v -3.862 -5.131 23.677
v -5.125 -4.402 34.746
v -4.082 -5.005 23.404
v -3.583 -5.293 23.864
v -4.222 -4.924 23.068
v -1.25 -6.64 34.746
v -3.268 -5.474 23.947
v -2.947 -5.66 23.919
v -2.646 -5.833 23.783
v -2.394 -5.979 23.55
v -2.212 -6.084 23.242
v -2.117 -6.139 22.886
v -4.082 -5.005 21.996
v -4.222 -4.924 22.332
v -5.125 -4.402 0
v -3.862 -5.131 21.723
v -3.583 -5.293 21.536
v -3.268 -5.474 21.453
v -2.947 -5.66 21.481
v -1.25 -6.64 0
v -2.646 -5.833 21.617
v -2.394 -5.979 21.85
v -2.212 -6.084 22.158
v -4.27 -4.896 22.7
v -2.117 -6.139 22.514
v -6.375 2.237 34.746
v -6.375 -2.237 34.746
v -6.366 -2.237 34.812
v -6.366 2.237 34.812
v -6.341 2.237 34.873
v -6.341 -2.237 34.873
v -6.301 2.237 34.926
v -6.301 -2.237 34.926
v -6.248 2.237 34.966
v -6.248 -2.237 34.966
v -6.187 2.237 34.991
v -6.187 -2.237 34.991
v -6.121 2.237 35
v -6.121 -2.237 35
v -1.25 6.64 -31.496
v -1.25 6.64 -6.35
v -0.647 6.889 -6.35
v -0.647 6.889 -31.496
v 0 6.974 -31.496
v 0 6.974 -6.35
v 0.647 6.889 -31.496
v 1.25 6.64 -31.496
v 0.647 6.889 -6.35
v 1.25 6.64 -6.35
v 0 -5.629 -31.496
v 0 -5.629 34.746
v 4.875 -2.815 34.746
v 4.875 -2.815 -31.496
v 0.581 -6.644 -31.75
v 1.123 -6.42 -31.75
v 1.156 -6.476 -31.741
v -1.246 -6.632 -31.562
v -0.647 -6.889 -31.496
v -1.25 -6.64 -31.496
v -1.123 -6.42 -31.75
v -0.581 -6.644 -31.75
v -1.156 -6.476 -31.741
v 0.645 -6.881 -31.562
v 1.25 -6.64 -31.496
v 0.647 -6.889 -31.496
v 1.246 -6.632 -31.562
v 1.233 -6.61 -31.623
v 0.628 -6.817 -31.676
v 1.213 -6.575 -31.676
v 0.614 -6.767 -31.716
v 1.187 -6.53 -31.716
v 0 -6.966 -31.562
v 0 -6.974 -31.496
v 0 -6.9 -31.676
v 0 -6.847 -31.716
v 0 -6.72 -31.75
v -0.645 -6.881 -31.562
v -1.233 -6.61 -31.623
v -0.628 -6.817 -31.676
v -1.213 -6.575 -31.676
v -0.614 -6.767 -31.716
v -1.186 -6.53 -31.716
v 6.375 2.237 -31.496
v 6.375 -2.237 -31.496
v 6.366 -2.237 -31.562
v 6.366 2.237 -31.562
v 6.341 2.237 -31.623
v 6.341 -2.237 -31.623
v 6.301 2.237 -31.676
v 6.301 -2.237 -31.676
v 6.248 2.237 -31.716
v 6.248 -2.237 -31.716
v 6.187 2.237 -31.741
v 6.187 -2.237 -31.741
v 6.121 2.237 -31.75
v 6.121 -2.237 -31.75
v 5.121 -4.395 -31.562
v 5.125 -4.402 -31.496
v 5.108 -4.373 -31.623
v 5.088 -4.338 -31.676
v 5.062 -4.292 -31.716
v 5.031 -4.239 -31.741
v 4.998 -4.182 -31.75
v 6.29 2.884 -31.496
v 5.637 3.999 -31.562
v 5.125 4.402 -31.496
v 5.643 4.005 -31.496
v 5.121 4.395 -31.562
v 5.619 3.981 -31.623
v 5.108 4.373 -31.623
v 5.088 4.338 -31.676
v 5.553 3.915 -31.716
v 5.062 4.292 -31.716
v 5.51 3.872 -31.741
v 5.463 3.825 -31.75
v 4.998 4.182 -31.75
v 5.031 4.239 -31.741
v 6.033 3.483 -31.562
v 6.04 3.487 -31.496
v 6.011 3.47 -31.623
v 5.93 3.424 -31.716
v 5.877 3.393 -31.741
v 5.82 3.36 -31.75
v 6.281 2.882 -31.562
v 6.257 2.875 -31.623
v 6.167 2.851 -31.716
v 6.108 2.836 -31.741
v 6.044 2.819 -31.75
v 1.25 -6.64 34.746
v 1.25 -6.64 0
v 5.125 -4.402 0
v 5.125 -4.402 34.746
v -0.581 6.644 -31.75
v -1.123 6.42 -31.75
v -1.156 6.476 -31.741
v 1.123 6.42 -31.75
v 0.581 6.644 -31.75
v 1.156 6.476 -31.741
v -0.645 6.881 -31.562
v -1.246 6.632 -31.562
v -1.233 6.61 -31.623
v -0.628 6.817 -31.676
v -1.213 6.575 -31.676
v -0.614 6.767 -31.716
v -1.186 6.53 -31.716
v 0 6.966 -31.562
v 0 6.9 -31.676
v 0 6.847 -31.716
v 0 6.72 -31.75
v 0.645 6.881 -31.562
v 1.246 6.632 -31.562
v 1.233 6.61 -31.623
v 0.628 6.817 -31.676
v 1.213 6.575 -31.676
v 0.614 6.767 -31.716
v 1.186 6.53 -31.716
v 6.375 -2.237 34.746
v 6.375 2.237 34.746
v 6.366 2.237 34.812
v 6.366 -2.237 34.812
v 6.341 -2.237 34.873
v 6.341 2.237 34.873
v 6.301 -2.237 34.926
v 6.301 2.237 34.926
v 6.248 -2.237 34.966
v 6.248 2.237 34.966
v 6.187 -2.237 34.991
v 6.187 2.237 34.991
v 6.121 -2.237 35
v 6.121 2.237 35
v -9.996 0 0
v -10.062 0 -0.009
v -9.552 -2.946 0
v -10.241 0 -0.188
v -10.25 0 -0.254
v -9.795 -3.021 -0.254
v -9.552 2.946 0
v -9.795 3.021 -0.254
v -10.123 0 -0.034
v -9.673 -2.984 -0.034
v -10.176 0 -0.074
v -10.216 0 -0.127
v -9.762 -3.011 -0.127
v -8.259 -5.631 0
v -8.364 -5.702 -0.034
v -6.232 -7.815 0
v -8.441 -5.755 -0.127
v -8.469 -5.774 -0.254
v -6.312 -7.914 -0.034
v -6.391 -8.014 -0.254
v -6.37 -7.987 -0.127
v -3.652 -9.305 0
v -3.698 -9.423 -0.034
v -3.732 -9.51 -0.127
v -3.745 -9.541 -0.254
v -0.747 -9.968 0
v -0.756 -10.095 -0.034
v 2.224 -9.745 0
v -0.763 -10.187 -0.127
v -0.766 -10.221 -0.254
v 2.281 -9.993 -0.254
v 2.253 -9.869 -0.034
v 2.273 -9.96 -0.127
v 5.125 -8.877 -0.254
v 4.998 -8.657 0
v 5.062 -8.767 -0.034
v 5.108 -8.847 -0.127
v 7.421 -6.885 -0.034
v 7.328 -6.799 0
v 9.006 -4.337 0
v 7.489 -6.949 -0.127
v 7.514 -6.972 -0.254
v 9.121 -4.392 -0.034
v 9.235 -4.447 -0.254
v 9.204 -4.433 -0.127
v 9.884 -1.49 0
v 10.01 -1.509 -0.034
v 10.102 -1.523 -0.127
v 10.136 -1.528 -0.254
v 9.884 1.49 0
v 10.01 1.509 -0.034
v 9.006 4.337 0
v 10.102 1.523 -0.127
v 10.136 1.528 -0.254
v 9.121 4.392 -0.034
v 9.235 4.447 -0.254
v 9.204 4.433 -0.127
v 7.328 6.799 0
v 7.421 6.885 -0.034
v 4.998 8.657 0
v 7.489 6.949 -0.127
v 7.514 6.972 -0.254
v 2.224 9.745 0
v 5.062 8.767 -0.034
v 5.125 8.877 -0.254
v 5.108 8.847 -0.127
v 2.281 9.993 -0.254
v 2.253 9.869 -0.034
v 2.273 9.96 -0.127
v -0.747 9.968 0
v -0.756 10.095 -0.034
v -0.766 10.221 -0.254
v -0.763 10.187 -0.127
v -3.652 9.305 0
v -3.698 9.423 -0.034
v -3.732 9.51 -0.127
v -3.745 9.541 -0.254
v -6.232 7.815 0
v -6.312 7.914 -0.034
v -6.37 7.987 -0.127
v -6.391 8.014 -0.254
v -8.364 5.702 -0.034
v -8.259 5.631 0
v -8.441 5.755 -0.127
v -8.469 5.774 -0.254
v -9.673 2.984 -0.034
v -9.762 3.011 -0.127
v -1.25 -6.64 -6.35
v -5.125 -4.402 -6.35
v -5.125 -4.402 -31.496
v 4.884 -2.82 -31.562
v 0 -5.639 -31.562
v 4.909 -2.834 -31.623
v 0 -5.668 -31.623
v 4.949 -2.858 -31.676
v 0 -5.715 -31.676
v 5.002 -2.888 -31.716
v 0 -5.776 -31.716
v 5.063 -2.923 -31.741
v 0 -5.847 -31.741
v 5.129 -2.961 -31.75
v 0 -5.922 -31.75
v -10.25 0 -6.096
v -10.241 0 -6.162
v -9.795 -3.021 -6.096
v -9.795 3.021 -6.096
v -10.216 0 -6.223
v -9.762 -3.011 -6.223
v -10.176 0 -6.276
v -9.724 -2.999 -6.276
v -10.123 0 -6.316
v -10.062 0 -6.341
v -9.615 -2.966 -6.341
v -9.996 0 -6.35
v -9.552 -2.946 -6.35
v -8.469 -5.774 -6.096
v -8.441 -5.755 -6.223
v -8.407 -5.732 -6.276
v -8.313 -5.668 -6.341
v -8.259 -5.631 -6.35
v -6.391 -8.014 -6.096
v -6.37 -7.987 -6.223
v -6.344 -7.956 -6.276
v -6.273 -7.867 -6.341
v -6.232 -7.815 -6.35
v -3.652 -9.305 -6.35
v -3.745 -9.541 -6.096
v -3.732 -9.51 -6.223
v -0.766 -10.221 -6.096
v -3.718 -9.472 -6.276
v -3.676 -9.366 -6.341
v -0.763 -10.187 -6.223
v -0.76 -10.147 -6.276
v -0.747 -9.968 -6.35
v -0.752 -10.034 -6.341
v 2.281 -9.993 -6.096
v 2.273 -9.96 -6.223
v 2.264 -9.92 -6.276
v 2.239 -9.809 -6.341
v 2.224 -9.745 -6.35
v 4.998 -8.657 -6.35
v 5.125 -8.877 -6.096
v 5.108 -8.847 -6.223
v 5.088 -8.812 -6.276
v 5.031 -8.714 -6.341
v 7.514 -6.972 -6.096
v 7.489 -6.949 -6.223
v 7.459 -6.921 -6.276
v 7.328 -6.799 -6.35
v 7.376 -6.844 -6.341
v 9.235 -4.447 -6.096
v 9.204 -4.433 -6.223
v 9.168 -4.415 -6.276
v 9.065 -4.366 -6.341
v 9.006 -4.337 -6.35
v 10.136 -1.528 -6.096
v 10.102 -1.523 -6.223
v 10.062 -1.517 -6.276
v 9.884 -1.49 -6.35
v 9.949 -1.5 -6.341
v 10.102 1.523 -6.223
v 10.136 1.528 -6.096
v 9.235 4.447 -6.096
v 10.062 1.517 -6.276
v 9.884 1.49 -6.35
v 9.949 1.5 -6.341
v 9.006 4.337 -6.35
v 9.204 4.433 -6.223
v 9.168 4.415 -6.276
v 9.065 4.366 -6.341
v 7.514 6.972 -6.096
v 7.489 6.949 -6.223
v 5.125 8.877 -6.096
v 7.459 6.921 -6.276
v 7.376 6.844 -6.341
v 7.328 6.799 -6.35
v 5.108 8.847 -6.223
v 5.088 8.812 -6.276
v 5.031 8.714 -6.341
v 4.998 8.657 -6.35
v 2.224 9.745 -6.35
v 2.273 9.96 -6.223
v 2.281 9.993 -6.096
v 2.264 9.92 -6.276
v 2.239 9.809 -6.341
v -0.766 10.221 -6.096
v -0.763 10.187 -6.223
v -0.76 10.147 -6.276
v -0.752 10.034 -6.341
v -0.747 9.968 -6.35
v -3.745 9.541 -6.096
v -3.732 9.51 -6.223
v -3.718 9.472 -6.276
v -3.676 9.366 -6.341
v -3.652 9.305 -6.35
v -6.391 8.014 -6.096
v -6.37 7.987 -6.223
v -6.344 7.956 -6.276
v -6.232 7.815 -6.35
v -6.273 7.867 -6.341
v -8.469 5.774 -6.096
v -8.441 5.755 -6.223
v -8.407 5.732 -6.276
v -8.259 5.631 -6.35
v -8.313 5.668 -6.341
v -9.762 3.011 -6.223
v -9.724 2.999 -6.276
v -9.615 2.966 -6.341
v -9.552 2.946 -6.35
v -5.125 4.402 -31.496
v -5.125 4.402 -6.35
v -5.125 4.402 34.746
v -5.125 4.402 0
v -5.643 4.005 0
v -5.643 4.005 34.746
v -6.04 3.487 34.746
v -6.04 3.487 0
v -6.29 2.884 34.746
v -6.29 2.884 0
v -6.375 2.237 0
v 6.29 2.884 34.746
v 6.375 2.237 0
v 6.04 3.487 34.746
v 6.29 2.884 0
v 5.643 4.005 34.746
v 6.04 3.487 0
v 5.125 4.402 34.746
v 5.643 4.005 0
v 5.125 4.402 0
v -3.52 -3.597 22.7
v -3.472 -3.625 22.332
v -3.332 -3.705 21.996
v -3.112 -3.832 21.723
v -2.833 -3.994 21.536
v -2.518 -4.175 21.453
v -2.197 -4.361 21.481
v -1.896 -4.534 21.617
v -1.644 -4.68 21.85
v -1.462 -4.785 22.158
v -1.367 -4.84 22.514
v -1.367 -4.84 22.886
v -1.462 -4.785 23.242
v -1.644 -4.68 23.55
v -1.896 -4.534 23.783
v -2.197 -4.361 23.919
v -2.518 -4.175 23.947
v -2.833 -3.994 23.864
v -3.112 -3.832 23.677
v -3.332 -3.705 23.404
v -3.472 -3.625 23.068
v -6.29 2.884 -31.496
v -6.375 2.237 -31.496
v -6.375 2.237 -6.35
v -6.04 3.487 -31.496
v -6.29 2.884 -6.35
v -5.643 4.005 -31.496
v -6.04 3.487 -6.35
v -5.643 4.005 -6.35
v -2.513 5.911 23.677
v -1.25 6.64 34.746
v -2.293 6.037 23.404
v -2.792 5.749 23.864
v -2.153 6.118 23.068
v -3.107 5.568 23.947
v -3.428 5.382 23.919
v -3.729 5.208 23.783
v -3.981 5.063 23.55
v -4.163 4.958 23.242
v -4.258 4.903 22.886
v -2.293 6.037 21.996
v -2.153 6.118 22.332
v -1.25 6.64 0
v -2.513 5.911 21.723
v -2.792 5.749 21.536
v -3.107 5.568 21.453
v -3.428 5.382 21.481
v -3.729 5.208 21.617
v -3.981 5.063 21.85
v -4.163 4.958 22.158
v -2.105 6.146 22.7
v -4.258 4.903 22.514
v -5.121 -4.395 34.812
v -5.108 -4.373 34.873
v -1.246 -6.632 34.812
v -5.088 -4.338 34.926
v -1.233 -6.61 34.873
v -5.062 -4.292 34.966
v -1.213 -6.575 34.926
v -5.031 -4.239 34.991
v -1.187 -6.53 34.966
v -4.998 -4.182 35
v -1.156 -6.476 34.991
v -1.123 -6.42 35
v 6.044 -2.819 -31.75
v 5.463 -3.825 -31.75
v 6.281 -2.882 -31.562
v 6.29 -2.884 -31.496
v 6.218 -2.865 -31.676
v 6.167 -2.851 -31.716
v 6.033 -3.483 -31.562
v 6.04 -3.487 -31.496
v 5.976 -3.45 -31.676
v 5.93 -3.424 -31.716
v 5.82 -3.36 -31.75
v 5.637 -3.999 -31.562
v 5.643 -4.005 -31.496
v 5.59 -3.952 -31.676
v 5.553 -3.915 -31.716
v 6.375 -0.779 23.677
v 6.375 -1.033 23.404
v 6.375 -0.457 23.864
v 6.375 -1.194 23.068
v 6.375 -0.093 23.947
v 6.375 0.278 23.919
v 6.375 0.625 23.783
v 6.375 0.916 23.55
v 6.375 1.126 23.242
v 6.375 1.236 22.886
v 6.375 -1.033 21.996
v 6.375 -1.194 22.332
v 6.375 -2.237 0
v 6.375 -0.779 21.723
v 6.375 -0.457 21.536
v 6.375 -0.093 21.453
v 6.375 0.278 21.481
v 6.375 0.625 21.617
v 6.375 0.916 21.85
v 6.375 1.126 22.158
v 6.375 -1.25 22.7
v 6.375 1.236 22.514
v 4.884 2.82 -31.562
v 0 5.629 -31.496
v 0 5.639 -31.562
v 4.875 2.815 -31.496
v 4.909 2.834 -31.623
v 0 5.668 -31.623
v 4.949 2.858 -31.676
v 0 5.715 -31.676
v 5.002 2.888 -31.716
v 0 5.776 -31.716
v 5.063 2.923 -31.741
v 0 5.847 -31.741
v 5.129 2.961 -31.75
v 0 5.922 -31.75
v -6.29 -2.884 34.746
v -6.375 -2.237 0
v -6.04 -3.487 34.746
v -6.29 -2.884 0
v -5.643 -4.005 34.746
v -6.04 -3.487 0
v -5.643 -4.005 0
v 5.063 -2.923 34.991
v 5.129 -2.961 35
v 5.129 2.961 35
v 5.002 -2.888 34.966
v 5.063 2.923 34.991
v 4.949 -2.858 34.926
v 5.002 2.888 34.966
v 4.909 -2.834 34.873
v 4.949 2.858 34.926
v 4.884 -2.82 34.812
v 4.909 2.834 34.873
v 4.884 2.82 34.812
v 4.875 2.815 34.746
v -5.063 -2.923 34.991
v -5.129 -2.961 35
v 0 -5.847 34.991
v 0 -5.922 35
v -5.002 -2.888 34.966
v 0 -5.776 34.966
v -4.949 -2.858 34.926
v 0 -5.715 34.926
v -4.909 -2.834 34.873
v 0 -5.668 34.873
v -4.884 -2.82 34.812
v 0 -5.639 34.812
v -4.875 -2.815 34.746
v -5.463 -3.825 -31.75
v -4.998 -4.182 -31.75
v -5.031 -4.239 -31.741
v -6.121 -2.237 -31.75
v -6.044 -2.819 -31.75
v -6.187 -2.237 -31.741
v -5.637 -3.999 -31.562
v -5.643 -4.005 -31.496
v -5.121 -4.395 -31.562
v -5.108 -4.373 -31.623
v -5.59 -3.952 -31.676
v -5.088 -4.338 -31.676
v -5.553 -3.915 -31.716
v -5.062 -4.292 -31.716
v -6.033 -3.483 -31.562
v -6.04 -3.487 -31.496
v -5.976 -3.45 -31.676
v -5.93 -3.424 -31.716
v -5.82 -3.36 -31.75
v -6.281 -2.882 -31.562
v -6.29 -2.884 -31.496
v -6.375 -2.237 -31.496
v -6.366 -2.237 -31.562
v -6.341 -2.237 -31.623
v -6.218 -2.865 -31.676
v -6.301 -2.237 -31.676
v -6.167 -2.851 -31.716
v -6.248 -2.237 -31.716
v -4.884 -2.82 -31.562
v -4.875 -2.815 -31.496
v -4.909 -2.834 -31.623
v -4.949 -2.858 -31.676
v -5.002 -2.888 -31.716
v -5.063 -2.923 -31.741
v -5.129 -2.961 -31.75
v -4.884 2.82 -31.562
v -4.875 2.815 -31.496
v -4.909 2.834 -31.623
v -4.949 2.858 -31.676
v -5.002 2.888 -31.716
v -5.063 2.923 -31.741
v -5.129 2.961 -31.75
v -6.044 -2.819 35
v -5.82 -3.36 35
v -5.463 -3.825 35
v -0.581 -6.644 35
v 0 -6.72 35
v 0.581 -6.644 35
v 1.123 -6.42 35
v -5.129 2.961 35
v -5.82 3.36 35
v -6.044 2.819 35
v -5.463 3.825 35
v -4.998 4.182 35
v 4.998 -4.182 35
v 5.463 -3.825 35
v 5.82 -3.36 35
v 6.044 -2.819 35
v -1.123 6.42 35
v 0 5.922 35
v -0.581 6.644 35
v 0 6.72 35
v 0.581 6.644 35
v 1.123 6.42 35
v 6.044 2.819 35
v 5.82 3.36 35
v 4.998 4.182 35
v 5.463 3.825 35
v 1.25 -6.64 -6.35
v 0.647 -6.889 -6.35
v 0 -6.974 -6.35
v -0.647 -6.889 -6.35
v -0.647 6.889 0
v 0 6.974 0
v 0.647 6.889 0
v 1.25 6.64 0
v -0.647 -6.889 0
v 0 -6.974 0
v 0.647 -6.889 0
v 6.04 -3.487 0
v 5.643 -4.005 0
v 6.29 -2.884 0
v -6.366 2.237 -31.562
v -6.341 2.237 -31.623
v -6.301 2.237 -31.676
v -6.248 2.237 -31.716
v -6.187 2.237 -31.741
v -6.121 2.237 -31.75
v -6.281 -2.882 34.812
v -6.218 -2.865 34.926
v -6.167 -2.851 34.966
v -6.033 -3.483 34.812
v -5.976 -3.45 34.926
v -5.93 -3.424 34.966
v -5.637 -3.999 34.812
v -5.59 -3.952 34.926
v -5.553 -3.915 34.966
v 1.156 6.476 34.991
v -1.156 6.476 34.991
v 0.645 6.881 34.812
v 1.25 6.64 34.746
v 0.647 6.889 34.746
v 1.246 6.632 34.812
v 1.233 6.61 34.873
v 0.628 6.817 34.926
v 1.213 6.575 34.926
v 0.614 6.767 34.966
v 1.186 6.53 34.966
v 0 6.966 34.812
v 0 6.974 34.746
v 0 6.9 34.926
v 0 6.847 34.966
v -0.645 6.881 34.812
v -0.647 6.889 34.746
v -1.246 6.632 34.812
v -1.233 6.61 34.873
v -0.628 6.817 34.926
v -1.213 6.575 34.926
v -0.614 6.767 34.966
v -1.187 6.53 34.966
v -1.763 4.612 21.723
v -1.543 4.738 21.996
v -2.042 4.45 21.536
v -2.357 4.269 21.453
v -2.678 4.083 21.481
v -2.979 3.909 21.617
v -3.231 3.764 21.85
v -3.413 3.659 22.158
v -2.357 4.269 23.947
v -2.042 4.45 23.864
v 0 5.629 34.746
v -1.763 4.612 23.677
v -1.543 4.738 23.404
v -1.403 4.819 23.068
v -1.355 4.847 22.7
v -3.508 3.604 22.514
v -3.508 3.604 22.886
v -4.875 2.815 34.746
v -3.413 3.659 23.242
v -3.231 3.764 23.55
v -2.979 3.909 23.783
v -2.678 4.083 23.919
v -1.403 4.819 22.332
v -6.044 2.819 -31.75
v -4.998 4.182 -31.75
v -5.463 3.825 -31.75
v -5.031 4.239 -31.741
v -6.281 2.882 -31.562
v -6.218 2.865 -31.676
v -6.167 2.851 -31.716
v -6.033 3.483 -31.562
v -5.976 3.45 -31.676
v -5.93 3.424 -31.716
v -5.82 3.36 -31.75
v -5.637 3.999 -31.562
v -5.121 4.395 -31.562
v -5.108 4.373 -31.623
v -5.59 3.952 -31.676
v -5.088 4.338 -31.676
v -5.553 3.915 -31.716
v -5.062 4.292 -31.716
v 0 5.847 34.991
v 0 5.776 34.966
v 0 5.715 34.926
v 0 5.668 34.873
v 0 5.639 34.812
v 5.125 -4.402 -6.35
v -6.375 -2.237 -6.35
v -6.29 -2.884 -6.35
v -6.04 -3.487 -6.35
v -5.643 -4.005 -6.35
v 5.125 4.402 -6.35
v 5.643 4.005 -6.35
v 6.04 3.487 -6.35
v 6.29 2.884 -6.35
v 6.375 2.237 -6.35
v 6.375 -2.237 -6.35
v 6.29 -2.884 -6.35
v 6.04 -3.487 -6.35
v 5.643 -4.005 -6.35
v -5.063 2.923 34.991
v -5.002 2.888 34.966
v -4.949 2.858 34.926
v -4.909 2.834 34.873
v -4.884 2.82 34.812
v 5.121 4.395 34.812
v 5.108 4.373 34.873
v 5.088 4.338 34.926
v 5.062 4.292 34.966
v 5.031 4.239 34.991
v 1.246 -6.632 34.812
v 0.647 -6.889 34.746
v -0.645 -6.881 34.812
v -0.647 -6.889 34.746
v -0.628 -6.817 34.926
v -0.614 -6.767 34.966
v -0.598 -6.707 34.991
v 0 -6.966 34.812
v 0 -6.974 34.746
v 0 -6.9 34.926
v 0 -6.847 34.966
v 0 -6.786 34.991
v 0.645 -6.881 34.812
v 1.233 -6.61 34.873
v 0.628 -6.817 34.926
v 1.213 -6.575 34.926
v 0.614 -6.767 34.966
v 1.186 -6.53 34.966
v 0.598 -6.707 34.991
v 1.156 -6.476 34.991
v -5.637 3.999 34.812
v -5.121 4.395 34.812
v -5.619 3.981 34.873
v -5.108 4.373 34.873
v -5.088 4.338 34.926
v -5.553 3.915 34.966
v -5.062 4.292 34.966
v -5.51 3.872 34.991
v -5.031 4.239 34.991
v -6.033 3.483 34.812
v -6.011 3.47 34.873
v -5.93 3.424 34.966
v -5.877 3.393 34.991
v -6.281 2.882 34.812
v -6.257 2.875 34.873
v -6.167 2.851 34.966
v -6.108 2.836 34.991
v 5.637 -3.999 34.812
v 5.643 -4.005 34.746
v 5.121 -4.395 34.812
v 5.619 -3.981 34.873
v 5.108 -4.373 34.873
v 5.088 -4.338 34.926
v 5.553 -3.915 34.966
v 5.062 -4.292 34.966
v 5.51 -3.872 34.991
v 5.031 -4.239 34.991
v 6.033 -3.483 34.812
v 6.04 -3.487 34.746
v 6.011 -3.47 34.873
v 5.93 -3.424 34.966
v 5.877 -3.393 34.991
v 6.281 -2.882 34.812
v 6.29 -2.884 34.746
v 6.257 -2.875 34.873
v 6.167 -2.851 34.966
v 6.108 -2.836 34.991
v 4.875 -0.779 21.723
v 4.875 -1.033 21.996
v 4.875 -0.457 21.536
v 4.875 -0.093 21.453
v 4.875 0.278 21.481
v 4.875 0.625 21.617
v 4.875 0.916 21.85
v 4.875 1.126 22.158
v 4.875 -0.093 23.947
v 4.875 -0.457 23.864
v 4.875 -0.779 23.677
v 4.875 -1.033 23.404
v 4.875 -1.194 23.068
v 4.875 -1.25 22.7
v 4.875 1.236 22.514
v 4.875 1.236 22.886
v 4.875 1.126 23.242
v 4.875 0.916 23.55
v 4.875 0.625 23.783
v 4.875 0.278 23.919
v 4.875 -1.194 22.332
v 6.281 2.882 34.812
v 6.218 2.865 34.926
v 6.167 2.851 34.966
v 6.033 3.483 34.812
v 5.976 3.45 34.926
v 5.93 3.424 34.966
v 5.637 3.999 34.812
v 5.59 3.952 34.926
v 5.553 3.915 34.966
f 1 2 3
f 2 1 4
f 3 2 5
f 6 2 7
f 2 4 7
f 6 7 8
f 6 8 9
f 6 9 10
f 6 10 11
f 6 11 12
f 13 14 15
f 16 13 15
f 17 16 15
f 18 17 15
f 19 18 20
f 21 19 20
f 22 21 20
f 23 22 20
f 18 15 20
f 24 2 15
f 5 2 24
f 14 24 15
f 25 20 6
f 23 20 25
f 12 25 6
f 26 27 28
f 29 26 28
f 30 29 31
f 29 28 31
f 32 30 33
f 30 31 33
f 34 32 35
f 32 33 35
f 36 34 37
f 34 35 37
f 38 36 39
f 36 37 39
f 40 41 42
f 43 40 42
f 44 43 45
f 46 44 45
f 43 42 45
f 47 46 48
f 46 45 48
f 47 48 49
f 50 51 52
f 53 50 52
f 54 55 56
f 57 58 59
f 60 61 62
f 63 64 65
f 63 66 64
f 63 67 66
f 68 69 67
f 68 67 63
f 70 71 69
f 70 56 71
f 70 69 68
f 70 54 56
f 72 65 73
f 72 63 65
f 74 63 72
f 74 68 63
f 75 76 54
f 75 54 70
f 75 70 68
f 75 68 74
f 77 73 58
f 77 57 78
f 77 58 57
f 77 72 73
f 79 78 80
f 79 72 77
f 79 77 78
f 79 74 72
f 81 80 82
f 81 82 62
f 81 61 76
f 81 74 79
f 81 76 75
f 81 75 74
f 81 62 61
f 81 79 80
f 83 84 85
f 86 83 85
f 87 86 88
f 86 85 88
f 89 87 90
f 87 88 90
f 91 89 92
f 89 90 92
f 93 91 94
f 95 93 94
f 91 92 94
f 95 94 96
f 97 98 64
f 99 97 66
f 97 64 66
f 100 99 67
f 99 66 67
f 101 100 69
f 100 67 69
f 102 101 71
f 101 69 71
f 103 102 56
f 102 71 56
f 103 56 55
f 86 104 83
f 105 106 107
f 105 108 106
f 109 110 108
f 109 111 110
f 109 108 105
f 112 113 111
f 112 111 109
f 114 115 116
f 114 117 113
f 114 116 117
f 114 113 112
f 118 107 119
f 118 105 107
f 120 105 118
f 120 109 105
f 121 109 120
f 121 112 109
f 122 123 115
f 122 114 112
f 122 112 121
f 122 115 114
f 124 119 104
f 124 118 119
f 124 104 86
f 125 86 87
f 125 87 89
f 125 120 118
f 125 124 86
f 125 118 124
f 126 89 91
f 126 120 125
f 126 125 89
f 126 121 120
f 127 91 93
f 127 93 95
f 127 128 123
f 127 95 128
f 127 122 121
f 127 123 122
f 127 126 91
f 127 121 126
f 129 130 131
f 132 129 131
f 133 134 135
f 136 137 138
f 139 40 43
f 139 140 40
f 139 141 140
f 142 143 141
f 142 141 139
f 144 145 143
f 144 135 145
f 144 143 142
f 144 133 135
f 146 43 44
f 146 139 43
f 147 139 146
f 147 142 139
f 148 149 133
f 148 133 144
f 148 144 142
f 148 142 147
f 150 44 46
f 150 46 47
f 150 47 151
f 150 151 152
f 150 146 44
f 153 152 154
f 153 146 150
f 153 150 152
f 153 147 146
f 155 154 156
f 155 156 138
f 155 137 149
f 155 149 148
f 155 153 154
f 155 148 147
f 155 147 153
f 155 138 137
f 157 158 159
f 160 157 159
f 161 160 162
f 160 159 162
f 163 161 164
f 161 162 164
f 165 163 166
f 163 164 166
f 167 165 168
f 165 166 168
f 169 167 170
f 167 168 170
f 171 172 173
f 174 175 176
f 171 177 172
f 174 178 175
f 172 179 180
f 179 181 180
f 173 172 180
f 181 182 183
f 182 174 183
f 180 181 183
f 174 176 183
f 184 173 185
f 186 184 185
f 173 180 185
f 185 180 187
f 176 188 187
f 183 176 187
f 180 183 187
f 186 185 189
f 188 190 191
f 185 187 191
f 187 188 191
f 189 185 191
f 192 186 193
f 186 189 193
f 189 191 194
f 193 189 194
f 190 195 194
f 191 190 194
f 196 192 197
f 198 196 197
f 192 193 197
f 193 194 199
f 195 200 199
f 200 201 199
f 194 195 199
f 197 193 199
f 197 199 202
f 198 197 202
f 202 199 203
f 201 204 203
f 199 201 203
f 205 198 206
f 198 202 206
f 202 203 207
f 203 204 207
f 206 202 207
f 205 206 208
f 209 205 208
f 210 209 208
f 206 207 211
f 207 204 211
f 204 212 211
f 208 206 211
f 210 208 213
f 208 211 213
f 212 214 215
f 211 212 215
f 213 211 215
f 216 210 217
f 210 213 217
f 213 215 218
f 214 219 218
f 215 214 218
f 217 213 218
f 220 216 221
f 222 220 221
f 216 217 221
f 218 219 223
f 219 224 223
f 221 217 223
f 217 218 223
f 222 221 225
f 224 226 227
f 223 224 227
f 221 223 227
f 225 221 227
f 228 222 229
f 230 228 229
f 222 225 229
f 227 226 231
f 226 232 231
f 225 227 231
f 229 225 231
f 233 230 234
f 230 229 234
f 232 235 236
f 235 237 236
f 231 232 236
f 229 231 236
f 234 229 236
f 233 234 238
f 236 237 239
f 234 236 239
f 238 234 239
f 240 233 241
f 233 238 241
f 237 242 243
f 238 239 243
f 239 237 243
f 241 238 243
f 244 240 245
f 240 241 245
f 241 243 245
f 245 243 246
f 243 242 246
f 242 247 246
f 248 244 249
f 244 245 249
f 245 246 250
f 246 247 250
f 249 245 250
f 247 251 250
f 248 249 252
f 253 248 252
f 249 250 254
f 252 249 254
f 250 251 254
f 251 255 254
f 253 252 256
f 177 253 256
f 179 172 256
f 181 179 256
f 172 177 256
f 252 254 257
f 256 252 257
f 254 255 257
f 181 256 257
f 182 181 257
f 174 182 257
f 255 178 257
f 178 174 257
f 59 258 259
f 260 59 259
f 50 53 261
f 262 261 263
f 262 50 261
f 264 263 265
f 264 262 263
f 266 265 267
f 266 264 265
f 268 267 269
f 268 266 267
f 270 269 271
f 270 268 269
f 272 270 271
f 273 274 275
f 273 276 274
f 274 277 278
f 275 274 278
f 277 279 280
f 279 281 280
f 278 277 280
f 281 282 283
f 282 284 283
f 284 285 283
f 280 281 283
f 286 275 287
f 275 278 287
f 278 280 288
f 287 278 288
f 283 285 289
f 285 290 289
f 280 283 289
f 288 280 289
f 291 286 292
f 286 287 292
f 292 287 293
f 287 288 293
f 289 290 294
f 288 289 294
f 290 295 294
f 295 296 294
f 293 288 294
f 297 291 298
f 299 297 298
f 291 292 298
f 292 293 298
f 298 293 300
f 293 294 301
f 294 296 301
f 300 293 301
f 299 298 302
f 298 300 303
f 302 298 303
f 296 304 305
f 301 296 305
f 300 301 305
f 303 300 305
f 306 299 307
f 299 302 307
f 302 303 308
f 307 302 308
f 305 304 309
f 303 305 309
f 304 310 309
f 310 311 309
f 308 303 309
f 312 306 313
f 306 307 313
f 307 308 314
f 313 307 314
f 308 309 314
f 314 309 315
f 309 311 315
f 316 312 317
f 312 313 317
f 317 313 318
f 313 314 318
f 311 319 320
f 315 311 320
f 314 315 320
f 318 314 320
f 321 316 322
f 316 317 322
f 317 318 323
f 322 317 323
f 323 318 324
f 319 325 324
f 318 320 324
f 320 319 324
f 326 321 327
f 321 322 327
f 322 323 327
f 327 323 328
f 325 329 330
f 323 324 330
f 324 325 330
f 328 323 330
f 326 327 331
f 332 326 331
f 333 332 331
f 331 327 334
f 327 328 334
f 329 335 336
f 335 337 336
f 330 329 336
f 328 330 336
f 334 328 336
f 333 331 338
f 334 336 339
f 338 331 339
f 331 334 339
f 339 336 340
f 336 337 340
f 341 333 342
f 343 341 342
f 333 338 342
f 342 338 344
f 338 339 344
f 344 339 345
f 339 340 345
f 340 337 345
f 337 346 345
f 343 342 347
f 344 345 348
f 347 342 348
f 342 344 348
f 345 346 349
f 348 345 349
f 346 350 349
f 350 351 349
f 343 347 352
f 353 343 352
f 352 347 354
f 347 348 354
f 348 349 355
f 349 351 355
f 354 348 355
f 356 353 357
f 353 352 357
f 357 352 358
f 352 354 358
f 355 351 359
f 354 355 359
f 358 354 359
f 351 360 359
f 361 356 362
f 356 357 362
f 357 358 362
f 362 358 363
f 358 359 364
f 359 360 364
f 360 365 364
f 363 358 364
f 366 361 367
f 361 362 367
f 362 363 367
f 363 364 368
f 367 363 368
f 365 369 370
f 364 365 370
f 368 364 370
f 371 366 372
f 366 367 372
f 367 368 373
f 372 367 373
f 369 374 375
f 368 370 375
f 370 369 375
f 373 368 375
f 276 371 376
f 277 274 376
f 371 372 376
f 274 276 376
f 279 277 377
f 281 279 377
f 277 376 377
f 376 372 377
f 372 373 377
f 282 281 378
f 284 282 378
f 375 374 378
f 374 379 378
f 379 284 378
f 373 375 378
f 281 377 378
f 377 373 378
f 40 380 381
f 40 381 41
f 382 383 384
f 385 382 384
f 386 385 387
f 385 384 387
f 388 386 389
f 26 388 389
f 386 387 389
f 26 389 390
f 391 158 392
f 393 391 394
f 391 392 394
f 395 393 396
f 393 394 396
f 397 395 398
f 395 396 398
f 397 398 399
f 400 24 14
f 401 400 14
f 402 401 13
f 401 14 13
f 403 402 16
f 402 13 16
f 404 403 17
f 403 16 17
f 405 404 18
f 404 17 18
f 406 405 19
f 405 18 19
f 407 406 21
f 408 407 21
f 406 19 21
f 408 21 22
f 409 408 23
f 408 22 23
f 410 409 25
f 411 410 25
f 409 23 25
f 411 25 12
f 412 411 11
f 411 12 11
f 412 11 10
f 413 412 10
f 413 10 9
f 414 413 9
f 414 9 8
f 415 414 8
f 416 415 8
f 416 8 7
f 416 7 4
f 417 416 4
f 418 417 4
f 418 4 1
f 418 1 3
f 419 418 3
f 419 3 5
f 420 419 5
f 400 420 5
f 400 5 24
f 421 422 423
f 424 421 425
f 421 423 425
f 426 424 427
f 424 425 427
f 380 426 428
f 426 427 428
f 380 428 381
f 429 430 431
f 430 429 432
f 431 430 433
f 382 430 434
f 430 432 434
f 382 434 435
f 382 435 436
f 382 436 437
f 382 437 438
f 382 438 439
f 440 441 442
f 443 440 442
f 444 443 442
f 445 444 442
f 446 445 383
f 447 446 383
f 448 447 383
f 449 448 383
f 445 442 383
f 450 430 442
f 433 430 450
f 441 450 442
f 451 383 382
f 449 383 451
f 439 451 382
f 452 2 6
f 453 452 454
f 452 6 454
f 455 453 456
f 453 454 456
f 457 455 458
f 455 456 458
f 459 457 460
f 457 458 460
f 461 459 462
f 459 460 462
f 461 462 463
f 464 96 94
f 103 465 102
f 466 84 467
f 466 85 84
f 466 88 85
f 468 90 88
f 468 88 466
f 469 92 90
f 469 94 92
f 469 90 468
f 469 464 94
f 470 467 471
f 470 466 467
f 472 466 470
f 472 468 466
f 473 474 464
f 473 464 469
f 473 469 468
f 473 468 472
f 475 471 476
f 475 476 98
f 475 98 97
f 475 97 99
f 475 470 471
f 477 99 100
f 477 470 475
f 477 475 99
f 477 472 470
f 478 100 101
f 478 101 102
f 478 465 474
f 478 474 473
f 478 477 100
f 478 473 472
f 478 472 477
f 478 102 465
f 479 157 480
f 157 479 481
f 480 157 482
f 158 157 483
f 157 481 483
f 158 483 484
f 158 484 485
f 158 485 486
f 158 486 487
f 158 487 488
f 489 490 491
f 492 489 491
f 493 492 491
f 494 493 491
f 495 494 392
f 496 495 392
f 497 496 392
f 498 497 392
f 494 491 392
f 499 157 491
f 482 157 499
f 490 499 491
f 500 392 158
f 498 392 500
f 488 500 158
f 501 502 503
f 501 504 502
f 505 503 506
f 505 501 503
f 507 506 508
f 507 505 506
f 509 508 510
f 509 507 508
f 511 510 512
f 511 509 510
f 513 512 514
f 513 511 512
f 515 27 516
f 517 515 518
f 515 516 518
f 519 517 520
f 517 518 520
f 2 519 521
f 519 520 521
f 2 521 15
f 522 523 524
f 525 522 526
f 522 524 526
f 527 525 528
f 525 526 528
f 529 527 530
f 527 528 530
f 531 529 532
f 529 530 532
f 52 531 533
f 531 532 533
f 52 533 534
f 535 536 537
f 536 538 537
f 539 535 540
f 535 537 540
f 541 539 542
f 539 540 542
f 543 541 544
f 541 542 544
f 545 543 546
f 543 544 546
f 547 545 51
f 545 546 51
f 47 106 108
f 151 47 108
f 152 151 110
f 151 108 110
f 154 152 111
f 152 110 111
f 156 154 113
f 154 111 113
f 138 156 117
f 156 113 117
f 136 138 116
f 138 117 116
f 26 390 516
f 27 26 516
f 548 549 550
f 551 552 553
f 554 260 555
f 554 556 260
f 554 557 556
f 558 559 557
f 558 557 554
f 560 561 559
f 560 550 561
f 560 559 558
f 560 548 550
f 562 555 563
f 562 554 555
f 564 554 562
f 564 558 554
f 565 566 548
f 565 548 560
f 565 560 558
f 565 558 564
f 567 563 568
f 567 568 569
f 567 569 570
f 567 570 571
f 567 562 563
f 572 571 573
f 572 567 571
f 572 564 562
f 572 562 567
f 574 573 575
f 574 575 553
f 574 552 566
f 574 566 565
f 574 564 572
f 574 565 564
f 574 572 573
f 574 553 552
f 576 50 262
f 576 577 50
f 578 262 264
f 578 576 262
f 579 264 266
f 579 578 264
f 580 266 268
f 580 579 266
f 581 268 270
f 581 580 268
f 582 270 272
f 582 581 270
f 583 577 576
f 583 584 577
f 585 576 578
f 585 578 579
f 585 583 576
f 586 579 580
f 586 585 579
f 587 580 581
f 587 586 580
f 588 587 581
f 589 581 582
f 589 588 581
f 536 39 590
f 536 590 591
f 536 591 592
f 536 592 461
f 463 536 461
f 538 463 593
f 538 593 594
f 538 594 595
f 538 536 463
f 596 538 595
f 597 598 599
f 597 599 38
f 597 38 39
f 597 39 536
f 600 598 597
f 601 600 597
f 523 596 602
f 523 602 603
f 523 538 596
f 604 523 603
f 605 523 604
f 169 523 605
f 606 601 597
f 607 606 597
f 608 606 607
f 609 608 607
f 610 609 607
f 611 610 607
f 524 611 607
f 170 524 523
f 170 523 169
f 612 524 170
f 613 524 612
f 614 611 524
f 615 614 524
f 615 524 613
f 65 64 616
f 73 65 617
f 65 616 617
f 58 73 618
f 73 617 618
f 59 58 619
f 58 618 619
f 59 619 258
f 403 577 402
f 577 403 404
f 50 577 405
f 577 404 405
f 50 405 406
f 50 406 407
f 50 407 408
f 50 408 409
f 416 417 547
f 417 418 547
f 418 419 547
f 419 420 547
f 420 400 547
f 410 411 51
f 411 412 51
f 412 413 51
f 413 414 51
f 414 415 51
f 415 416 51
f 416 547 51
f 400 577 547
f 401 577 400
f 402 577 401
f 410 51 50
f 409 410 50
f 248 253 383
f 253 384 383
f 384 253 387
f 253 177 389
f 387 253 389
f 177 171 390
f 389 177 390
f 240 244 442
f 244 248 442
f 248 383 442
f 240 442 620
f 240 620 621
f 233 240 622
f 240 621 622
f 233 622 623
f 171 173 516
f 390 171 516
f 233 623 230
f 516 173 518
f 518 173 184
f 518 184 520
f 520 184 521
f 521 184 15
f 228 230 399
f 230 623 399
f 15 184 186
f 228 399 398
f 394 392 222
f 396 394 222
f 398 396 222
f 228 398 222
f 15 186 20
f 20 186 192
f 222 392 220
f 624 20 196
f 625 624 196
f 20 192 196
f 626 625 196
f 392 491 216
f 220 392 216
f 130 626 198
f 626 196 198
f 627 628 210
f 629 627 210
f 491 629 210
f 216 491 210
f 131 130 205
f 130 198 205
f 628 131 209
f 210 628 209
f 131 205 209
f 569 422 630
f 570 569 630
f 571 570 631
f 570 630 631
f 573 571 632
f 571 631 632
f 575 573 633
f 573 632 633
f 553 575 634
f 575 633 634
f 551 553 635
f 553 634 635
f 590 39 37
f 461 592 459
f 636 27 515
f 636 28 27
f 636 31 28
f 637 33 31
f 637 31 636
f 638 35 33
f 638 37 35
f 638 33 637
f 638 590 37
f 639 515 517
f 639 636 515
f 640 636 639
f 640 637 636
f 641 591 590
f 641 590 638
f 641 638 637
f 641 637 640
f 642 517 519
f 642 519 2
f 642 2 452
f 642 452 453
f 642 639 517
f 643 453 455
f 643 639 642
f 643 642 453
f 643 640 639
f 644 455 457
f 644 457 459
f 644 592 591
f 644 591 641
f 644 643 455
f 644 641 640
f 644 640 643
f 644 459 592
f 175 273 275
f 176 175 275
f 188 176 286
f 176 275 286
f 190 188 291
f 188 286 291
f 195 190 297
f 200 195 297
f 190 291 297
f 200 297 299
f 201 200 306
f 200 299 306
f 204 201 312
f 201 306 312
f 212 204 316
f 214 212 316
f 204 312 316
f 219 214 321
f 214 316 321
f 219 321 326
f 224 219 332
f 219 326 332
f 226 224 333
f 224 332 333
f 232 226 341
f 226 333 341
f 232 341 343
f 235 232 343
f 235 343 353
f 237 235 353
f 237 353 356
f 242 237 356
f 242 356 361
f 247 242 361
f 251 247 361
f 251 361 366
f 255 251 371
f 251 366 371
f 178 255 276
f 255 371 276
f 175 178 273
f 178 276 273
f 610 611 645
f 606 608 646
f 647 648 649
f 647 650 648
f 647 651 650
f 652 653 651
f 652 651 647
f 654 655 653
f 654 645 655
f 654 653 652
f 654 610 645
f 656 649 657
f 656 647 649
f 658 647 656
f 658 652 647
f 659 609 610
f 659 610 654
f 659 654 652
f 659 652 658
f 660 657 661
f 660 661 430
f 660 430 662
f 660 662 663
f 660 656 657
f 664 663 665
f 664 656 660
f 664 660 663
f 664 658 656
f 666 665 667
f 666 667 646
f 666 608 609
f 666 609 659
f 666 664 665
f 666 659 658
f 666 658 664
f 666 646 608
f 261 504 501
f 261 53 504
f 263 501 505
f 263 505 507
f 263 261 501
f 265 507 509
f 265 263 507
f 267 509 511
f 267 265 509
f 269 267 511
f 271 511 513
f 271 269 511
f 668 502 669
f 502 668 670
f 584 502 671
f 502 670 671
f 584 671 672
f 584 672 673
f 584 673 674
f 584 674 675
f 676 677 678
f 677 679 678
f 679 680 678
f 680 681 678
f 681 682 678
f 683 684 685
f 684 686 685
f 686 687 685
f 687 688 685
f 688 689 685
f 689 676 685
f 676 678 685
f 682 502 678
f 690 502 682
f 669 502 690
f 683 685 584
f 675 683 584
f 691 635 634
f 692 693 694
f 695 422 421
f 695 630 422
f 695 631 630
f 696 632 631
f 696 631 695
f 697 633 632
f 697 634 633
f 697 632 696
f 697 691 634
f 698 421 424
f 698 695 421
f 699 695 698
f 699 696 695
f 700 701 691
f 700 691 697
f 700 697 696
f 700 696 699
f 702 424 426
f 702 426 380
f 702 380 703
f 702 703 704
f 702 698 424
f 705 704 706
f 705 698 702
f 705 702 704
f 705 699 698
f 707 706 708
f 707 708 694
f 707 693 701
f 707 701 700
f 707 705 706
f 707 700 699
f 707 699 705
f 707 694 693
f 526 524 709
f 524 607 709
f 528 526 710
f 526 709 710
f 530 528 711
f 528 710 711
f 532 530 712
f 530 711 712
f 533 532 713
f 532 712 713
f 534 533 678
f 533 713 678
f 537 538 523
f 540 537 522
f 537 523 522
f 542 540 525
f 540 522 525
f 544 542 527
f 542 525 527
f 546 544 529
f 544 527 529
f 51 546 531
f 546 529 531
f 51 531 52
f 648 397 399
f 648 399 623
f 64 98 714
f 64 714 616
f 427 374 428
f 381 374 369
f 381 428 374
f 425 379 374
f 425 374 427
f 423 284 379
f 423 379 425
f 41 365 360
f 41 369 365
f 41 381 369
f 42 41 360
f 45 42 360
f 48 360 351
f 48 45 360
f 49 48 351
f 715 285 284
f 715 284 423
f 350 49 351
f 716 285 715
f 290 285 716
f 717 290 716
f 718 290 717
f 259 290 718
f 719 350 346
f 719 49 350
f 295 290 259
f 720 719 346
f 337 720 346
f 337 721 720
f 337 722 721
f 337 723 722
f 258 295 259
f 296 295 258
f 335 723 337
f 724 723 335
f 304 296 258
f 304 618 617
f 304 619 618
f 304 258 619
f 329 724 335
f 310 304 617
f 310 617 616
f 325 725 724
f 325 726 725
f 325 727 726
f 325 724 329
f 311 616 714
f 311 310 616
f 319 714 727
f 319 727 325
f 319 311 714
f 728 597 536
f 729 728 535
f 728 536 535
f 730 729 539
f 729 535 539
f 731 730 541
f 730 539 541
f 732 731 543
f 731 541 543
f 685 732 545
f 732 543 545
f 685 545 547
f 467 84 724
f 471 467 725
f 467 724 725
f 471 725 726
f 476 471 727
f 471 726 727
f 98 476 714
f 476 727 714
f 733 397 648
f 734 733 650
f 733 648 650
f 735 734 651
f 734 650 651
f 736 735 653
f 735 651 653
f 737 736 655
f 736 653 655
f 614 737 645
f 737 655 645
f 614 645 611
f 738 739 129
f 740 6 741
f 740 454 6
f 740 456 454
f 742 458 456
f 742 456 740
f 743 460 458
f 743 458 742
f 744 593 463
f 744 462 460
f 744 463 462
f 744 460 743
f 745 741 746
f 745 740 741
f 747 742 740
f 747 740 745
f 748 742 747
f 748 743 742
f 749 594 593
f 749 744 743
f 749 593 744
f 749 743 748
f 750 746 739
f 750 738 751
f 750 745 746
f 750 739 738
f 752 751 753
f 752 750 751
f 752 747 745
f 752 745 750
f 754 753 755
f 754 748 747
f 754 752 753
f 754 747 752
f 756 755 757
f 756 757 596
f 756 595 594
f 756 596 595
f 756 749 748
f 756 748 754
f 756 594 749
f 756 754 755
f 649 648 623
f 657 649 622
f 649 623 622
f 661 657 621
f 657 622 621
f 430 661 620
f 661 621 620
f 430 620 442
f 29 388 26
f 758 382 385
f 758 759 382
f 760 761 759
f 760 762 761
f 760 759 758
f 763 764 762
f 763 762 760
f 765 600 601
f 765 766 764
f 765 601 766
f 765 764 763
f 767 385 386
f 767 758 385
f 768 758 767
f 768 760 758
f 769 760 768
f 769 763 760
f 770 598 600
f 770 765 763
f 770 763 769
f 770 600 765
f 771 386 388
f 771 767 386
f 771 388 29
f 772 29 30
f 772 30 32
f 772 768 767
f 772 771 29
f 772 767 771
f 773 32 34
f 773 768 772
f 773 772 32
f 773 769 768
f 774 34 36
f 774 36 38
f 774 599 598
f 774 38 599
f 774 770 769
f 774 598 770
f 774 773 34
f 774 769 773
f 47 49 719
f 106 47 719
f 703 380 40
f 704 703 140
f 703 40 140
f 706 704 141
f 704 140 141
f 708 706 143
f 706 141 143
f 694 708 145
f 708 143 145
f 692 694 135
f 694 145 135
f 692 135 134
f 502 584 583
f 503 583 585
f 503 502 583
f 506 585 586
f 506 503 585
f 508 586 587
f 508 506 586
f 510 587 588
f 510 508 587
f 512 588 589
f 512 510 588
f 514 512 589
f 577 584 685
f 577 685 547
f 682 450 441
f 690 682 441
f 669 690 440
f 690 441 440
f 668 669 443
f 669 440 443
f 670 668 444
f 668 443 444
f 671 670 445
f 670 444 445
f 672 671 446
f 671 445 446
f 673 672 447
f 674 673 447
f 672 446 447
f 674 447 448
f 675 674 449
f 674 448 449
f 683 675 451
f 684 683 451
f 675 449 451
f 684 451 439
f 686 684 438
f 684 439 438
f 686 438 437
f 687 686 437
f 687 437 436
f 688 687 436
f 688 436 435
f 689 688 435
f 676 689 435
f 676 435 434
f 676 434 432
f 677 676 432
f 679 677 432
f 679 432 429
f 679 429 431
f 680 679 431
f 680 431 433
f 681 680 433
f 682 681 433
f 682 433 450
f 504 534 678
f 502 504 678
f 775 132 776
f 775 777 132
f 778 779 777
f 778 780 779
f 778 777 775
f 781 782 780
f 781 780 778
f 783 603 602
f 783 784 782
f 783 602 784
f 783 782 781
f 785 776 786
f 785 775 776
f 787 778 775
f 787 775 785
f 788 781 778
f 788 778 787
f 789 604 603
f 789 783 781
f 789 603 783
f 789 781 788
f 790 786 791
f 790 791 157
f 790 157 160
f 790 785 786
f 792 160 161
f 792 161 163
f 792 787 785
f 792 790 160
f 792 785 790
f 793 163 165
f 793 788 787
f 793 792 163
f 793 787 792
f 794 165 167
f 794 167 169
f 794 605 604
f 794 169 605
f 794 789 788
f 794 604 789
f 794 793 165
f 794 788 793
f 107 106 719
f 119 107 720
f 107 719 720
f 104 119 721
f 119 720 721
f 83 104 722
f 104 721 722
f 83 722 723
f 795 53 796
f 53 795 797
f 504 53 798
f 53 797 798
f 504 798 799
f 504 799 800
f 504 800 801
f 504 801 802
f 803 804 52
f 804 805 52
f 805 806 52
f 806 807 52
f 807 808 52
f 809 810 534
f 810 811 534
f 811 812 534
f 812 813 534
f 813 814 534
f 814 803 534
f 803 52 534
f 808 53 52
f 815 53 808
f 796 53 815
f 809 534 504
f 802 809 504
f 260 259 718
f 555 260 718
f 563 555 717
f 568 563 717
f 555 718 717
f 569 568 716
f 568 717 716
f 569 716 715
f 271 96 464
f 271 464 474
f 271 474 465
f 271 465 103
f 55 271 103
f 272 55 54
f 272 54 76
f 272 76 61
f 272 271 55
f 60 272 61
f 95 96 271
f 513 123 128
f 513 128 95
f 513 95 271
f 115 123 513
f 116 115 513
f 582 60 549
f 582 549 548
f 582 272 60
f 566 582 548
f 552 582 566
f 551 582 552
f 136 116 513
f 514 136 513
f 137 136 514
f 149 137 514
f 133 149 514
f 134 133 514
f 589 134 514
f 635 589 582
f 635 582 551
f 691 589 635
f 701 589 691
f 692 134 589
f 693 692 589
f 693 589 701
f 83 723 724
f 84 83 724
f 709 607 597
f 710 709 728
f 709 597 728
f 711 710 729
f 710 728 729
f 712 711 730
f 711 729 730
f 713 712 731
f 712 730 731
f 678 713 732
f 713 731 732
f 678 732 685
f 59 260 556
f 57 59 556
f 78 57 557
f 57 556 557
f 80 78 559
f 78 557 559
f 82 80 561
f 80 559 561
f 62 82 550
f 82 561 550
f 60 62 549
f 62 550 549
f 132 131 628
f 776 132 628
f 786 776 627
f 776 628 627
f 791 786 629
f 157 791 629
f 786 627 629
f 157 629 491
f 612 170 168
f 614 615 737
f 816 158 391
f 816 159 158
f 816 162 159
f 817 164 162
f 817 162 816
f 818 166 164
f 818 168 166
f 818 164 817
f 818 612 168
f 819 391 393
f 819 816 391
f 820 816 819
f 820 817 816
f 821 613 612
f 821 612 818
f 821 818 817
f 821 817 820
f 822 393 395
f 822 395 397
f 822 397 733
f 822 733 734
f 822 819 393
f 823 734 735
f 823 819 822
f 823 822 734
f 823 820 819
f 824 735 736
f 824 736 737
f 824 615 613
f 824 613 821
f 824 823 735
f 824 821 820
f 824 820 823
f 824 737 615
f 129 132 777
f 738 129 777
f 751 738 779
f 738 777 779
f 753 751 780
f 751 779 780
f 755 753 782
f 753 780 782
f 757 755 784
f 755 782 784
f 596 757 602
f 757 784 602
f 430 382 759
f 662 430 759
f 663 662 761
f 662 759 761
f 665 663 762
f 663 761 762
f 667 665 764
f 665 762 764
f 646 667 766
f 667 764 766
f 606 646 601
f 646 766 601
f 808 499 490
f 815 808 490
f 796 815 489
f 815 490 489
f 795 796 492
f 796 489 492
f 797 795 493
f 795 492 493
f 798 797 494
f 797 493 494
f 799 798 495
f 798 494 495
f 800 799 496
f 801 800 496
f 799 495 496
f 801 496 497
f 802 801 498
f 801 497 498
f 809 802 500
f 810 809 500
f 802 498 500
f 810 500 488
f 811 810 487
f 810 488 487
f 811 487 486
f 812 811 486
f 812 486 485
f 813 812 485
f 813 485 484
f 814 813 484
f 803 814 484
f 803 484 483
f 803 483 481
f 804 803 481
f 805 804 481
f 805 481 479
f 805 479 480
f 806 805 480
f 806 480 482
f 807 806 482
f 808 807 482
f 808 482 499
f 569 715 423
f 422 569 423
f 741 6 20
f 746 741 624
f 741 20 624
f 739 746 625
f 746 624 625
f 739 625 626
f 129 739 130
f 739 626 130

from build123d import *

# Parameters (mm, degrees)
SKETCH2_W          = 10.25
SKETCH2_H          = 6.35
BOTTOMSHAFT_DEPTH  = 25.4
TOPSHAFT_DEPTH     = 35
CUT_EXTRUDE1_DEPTH = 69.305837964
MOUNTHOLE_REACH    = 60.259
MOUNTHOLE_BORE_R   = 1.25
MOUNTHOLES_COUNT   = 3
FILLET1_R          = 0.254
FILLET2_R          = 2.5


with BuildPart() as part:
    # Sketch2 → Collar (revolve)
    with BuildSketch(Plane(origin=(0, 0, 0), x_dir=(1, 0, 0), z_dir=(0, 1, 0)), mode=Mode.PRIVATE) as collar_sk:
        with Locations((5.125, 3.175)):
            Rectangle(SKETCH2_W, SKETCH2_H)
    revolve(collar_sk.sketch.rotate(Axis((0, 0, -6.35), (0, 0, 1)), 180), axis=Axis((0, 0, -6.35), (0, 0, 1)))

    # Sketch3 → BottomShaft (add)
    with BuildSketch(Plane(origin=(0, 0, -6.35), x_dir=(-1, 0, 0), z_dir=(0, 0, -1))):
        Polygon((-6.375, -3.680607966), (0, -7.361215932), (6.375, -3.680607966), (6.375, 3.680607966), (0, 7.361215932), (-6.375, 3.680607966), align=None)
    extrude(amount=BOTTOMSHAFT_DEPTH)

    # Sketch4 → TopShaft (add)
    with BuildSketch(Plane.XY):
        Polygon((0, -7.361215932), (6.375, -3.680607966), (6.375, 3.680607966), (0, 7.361215932), (-6.375, 3.680607966), (-6.375, -3.680607966), align=None)
    extrude(amount=TOPSHAFT_DEPTH)

    # Sketch5 → Cut-Extrude1 (cut, through all)
    with BuildSketch(Plane.XY.offset(35)):
        Polygon((-4.875, -2.814582562), (0, -5.629165125), (4.875, -2.814582562), (4.875, 2.814582562), (0, 5.629165125), (-4.875, 2.814582562), align=None)
    extrude(amount=-CUT_EXTRUDE1_DEPTH, mode=Mode.SUBTRACT)

    # MountHole bore (on position points) → MountHole (cut, up to next)
    with BuildSketch(Plane(origin=(-3.1875, 5.520911949, 22.7), x_dir=(0.866025403784, 0.5, 0), z_dir=(-0.5, 0.866025403784, 0)), mode=Mode.PRIVATE) as mounthole_sk1:
        Circle(MOUNTHOLE_BORE_R)
    mounthole_tool1 = extrude(mounthole_sk1.sketch, amount=-MOUNTHOLE_REACH, mode=Mode.PRIVATE) & part.part
    mounthole = mounthole_tool1.solids().sort_by_distance((-3.1875, 5.520912, 22.7))[0]
    add(mounthole, mode=Mode.SUBTRACT)

    # MountHoleS: MountHole ×3 about axis
    mountholes_axis = Axis((0, 0, -6.35), (0, 0, -1))
    for i in range(1, MOUNTHOLES_COUNT):
        add(mounthole.rotate(mountholes_axis, i * 360 / MOUNTHOLES_COUNT), mode=Mode.SUBTRACT)

    # Fillet1
    fillet1_edges = [part.edges().sort_by_distance(p)[0] for p in [
        (6.375, 0, -31.75),
        (3.1875, -5.520911949, -31.75),
        (-3.1875, -5.520911949, -31.75),
        (-6.375, 0, -31.75),
        (-3.1875, 5.520911949, -31.75),
        (3.1875, 5.520911949, -31.75),
        (-3.1875, -5.520911949, 35),
        (3.1875, -5.520911949, 35),
        (6.375, 0, 35),
        (3.1875, 5.520911949, 35),
        (-3.1875, 5.520911949, 35),
        (-6.375, 0, 35),
        (10.25, 0, 0),
        (10.25, 0, -6.35),
        (-2.4375, -4.221873843, -31.75),
        (-4.875, 0, -31.75),
        (-2.4375, 4.221873843, -31.75),
        (2.4375, 4.221873843, -31.75),
        (4.875, 0, -31.75),
        (2.4375, -4.221873843, -31.75),
        (-2.4375, -4.221873843, 35),
        (2.4375, -4.221873843, 35),
        (4.875, 0, 35),
        (2.4375, 4.221873843, 35),
        (-2.4375, 4.221873843, 35),
        (-4.875, 0, 35),
    ]]
    fillet(fillet1_edges, radius=FILLET1_R)

    # Fillet2
    # the kernel refuses this fillet: 2.5 mm, written as the material it takes off along each edge
    with BuildSketch(Plane(origin=(-3.875, -2.237232293, -31.75), x_dir=(-0.5000000000000004, -0.8660254037844384, 0), z_dir=(0.8660254037844384, -0.5000000000000004, 0))) as fillet2_piece_1:
        with BuildLine():
            CenterArc((2.246, -0.254), 0.254, 0, 90)
            Line((2.5, -0.254), (2.5, 0))
            Line((2.5, 0), (2.246, 0))
        make_face()
    revolve(axis=Axis((-3.875, -2.237232293, -31.75), (0, 0, -1)), revolution_arc=60, mode=Mode.SUBTRACT)
    with BuildSketch(Plane(origin=(0, -4.474464586, -31.75), x_dir=(0.5000000000000002, -0.8660254037844386, 0), z_dir=(0.8660254037844386, 0.5000000000000002, 0))) as fillet2_piece_2:
        with BuildLine():
            CenterArc((2.246, -0.254), 0.254, 0, 90)
            Line((2.5, -0.254), (2.5, 0))
            Line((2.5, 0), (2.246, 0))
        make_face()
    revolve(axis=Axis((0, -4.474464586, -31.75), (0, 0, -1)), revolution_arc=60, mode=Mode.SUBTRACT)
    with BuildSketch(Plane(origin=(-3.875, 2.237232293, -31.75), x_dir=(-1, 0, 0), z_dir=(0, -1, 0))) as fillet2_piece_3:
        with BuildLine():
            CenterArc((2.246, -0.254), 0.254, 0, 90)
            Line((2.5, -0.254), (2.5, 0))
            Line((2.5, 0), (2.246, 0))
        make_face()
    revolve(axis=Axis((-3.875, 2.237232293, -31.75), (0, 0, -1)), revolution_arc=60, mode=Mode.SUBTRACT)
    with BuildSketch(Plane(origin=(3.875, -2.237232293, -31.75), x_dir=(1, 0, 0), z_dir=(0, 1, 0))) as fillet2_piece_4:
        with BuildLine():
            CenterArc((2.246, -0.254), 0.254, 0, 90)
            Line((2.5, -0.254), (2.5, 0))
            Line((2.5, 0), (2.246, 0))
        make_face()
    revolve(axis=Axis((3.875, -2.237232293, -31.75), (0, 0, -1)), revolution_arc=60, mode=Mode.SUBTRACT)
    with BuildSketch(Plane(origin=(0, 4.474464586, -31.75), x_dir=(-0.5, 0.8660254037844387, 0), z_dir=(-0.8660254037844387, -0.5, 0))) as fillet2_piece_5:
        with BuildLine():
            CenterArc((2.246, -0.254), 0.254, 0, 90)
            Line((2.5, -0.254), (2.5, 0))
            Line((2.5, 0), (2.246, 0))
        make_face()
    revolve(axis=Axis((0, 4.474464586, -31.75), (0, 0, -1)), revolution_arc=60, mode=Mode.SUBTRACT)
    with BuildSketch(Plane(origin=(3.875, 2.237232293, -31.75), x_dir=(0.5000000000000001, 0.8660254037844386, 0), z_dir=(-0.8660254037844386, 0.5000000000000001, 0))) as fillet2_piece_6:
        with BuildLine():
            CenterArc((2.246, -0.254), 0.254, 0, 90)
            Line((2.5, -0.254), (2.5, 0))
            Line((2.5, 0), (2.246, 0))
        make_face()
    revolve(axis=Axis((3.875, 2.237232293, -31.75), (0, 0, -1)), revolution_arc=60, mode=Mode.SUBTRACT)
    with BuildSketch(Plane(origin=(3.875, 2.237232293, 35), x_dir=(1, 0, 0), z_dir=(0, -1, 0))) as fillet2_piece_7:
        with BuildLine():
            CenterArc((2.246, -0.254), 0.254, 0, 90)
            Line((2.5, -0.254), (2.5, 0))
            Line((2.5, 0), (2.246, 0))
        make_face()
    revolve(axis=Axis((3.875, 2.237232293, 35), (0, 0, 1)), revolution_arc=60, mode=Mode.SUBTRACT)
    with BuildSketch(Plane(origin=(3.875, -2.237232293, 35), x_dir=(0.4999999999999999, -0.8660254037844387, 0), z_dir=(-0.8660254037844387, -0.4999999999999999, 0))) as fillet2_piece_8:
        with BuildLine():
            CenterArc((2.246, -0.254), 0.254, 0, 90)
            Line((2.5, -0.254), (2.5, 0))
            Line((2.5, 0), (2.246, 0))
        make_face()
    revolve(axis=Axis((3.875, -2.237232293, 35), (0, 0, 1)), revolution_arc=60, mode=Mode.SUBTRACT)
    with BuildSketch(Plane(origin=(0, 4.474464586, 35), x_dir=(0.49999999999999994, 0.8660254037844389, 0), z_dir=(0.8660254037844389, -0.49999999999999994, 0))) as fillet2_piece_9:
        with BuildLine():
            CenterArc((2.246, -0.254), 0.254, 0, 90)
            Line((2.5, -0.254), (2.5, 0))
            Line((2.5, 0), (2.246, 0))
        make_face()
    revolve(axis=Axis((0, 4.474464586, 35), (0, 0, 1)), revolution_arc=60, mode=Mode.SUBTRACT)
    with BuildSketch(Plane(origin=(0, -4.474464586, 35), x_dir=(-0.5000000000000001, -0.8660254037844387, 0), z_dir=(-0.8660254037844387, 0.5000000000000001, 0))) as fillet2_piece_10:
        with BuildLine():
            CenterArc((2.246, -0.254), 0.254, 0, 90)
            Line((2.5, -0.254), (2.5, 0))
            Line((2.5, 0), (2.246, 0))
        make_face()
    revolve(axis=Axis((0, -4.474464586, 35), (0, 0, 1)), revolution_arc=60, mode=Mode.SUBTRACT)
    with BuildSketch(Plane(origin=(-3.875, 2.237232293, 35), x_dir=(-0.5, 0.8660254037844387, 0), z_dir=(0.8660254037844387, 0.5, 0))) as fillet2_piece_11:
        with BuildLine():
            CenterArc((2.246, -0.254), 0.254, 0, 90)
            Line((2.5, -0.254), (2.5, 0))
            Line((2.5, 0), (2.246, 0))
        make_face()
    revolve(axis=Axis((-3.875, 2.237232293, 35), (0, 0, 1)), revolution_arc=60, mode=Mode.SUBTRACT)
    with BuildSketch(Plane(origin=(-3.875, -2.237232293, 35), x_dir=(-1, 0, 0), z_dir=(0, 1, 0))) as fillet2_piece_12:
        with BuildLine():
            CenterArc((2.246, -0.254), 0.254, 0, 90)
            Line((2.5, -0.254), (2.5, 0))
            Line((2.5, 0), (2.246, 0))
        make_face()
    revolve(axis=Axis((-3.875, -2.237232293, 35), (0, 0, 1)), revolution_arc=60, mode=Mode.SUBTRACT)
    with BuildSketch(Plane(origin=(-6.375, -3.680607966, 0), x_dir=(0, 1, 0), z_dir=(0, 0, 1)), Plane(origin=(-6.375, 3.680607966, 0), x_dir=(0.8660254037844388, 0.49999999999999956, 0), z_dir=(0, 0, 1)), Plane(origin=(0, 7.361215932, 0), x_dir=(0.8660254037844389, -0.4999999999999996, 0), z_dir=(0, 0, 1)), Plane(origin=(6.375, 3.680607966, 0), x_dir=(0, -1, 0), z_dir=(0, 0, 1)), Plane(origin=(6.375, -3.680607966, 0), x_dir=(-0.8660254037844388, -0.49999999999999956, 0), z_dir=(0, 0, 1))) as fillet2_piece_13:
        with BuildLine():
            CenterArc((FILLET2_R * 0.57735026919, -FILLET2_R), FILLET2_R, 90, 60)
            Line((-FILLET2_R * 0.288675134595, -FILLET2_R * 0.5), (0, 0))
            Line((0, 0), (FILLET2_R * 0.57735026919, 0))
        make_face()
    extrude(amount=35, mode=Mode.SUBTRACT)
    with BuildSketch(Plane(origin=(0, -7.361215932, 0), x_dir=(0.8660254037844388, 0.49999999999999983, 0), z_dir=(0, 0, 1))) as fillet2_piece_14:
        with BuildLine():
            CenterArc((FILLET2_R * 0.57735026919, FILLET2_R), FILLET2_R, 210, 60)
            Line((-FILLET2_R * 0.288675134595, FILLET2_R * 0.5), (0, 0))
            Line((0, 0), (FILLET2_R * 0.57735026919, 0))
        make_face()
    extrude(amount=35, mode=Mode.SUBTRACT)
    with BuildSketch(Plane(origin=(6.375, 3.680607966, -6.35), x_dir=(-0.8660254037844386, 0.5000000000000003, 0), z_dir=(0, 0, -1)), Plane(origin=(0, 7.361215932, -6.35), x_dir=(-0.8660254037844387, -0.49999999999999994, 0), z_dir=(0, 0, -1)), Plane(origin=(-6.375, 3.680607966, -6.35), x_dir=(0, -1, 0), z_dir=(0, 0, -1)), Plane(origin=(-6.375, -3.680607966, -6.35), x_dir=(0.8660254037844386, -0.5000000000000003, 0), z_dir=(0, 0, -1)), Plane(origin=(0, -7.361215932, -6.35), x_dir=(0.8660254037844386, 0.5, 0), z_dir=(0, 0, -1))) as fillet2_piece_15:
        with BuildLine():
            CenterArc((FILLET2_R * 0.57735026919, -FILLET2_R), FILLET2_R, 90, 60)
            Line((-FILLET2_R * 0.288675134595, -FILLET2_R * 0.5), (0, 0))
            Line((0, 0), (FILLET2_R * 0.57735026919, 0))
        make_face()
    extrude(amount=25.4, mode=Mode.SUBTRACT)
    with BuildSketch(Plane(origin=(6.375, -3.680607966, -6.35), x_dir=(-0.8660254037844385, -0.5000000000000003, 0), z_dir=(0, 0, -1))) as fillet2_piece_16:
        with BuildLine():
            CenterArc((FILLET2_R * 0.57735026919, FILLET2_R), FILLET2_R, 210, 60)
            Line((-FILLET2_R * 0.288675134595, FILLET2_R * 0.5), (0, 0))
            Line((0, 0), (FILLET2_R * 0.57735026919, 0))
        make_face()
    extrude(amount=25.4, mode=Mode.SUBTRACT)


solid = part.part
